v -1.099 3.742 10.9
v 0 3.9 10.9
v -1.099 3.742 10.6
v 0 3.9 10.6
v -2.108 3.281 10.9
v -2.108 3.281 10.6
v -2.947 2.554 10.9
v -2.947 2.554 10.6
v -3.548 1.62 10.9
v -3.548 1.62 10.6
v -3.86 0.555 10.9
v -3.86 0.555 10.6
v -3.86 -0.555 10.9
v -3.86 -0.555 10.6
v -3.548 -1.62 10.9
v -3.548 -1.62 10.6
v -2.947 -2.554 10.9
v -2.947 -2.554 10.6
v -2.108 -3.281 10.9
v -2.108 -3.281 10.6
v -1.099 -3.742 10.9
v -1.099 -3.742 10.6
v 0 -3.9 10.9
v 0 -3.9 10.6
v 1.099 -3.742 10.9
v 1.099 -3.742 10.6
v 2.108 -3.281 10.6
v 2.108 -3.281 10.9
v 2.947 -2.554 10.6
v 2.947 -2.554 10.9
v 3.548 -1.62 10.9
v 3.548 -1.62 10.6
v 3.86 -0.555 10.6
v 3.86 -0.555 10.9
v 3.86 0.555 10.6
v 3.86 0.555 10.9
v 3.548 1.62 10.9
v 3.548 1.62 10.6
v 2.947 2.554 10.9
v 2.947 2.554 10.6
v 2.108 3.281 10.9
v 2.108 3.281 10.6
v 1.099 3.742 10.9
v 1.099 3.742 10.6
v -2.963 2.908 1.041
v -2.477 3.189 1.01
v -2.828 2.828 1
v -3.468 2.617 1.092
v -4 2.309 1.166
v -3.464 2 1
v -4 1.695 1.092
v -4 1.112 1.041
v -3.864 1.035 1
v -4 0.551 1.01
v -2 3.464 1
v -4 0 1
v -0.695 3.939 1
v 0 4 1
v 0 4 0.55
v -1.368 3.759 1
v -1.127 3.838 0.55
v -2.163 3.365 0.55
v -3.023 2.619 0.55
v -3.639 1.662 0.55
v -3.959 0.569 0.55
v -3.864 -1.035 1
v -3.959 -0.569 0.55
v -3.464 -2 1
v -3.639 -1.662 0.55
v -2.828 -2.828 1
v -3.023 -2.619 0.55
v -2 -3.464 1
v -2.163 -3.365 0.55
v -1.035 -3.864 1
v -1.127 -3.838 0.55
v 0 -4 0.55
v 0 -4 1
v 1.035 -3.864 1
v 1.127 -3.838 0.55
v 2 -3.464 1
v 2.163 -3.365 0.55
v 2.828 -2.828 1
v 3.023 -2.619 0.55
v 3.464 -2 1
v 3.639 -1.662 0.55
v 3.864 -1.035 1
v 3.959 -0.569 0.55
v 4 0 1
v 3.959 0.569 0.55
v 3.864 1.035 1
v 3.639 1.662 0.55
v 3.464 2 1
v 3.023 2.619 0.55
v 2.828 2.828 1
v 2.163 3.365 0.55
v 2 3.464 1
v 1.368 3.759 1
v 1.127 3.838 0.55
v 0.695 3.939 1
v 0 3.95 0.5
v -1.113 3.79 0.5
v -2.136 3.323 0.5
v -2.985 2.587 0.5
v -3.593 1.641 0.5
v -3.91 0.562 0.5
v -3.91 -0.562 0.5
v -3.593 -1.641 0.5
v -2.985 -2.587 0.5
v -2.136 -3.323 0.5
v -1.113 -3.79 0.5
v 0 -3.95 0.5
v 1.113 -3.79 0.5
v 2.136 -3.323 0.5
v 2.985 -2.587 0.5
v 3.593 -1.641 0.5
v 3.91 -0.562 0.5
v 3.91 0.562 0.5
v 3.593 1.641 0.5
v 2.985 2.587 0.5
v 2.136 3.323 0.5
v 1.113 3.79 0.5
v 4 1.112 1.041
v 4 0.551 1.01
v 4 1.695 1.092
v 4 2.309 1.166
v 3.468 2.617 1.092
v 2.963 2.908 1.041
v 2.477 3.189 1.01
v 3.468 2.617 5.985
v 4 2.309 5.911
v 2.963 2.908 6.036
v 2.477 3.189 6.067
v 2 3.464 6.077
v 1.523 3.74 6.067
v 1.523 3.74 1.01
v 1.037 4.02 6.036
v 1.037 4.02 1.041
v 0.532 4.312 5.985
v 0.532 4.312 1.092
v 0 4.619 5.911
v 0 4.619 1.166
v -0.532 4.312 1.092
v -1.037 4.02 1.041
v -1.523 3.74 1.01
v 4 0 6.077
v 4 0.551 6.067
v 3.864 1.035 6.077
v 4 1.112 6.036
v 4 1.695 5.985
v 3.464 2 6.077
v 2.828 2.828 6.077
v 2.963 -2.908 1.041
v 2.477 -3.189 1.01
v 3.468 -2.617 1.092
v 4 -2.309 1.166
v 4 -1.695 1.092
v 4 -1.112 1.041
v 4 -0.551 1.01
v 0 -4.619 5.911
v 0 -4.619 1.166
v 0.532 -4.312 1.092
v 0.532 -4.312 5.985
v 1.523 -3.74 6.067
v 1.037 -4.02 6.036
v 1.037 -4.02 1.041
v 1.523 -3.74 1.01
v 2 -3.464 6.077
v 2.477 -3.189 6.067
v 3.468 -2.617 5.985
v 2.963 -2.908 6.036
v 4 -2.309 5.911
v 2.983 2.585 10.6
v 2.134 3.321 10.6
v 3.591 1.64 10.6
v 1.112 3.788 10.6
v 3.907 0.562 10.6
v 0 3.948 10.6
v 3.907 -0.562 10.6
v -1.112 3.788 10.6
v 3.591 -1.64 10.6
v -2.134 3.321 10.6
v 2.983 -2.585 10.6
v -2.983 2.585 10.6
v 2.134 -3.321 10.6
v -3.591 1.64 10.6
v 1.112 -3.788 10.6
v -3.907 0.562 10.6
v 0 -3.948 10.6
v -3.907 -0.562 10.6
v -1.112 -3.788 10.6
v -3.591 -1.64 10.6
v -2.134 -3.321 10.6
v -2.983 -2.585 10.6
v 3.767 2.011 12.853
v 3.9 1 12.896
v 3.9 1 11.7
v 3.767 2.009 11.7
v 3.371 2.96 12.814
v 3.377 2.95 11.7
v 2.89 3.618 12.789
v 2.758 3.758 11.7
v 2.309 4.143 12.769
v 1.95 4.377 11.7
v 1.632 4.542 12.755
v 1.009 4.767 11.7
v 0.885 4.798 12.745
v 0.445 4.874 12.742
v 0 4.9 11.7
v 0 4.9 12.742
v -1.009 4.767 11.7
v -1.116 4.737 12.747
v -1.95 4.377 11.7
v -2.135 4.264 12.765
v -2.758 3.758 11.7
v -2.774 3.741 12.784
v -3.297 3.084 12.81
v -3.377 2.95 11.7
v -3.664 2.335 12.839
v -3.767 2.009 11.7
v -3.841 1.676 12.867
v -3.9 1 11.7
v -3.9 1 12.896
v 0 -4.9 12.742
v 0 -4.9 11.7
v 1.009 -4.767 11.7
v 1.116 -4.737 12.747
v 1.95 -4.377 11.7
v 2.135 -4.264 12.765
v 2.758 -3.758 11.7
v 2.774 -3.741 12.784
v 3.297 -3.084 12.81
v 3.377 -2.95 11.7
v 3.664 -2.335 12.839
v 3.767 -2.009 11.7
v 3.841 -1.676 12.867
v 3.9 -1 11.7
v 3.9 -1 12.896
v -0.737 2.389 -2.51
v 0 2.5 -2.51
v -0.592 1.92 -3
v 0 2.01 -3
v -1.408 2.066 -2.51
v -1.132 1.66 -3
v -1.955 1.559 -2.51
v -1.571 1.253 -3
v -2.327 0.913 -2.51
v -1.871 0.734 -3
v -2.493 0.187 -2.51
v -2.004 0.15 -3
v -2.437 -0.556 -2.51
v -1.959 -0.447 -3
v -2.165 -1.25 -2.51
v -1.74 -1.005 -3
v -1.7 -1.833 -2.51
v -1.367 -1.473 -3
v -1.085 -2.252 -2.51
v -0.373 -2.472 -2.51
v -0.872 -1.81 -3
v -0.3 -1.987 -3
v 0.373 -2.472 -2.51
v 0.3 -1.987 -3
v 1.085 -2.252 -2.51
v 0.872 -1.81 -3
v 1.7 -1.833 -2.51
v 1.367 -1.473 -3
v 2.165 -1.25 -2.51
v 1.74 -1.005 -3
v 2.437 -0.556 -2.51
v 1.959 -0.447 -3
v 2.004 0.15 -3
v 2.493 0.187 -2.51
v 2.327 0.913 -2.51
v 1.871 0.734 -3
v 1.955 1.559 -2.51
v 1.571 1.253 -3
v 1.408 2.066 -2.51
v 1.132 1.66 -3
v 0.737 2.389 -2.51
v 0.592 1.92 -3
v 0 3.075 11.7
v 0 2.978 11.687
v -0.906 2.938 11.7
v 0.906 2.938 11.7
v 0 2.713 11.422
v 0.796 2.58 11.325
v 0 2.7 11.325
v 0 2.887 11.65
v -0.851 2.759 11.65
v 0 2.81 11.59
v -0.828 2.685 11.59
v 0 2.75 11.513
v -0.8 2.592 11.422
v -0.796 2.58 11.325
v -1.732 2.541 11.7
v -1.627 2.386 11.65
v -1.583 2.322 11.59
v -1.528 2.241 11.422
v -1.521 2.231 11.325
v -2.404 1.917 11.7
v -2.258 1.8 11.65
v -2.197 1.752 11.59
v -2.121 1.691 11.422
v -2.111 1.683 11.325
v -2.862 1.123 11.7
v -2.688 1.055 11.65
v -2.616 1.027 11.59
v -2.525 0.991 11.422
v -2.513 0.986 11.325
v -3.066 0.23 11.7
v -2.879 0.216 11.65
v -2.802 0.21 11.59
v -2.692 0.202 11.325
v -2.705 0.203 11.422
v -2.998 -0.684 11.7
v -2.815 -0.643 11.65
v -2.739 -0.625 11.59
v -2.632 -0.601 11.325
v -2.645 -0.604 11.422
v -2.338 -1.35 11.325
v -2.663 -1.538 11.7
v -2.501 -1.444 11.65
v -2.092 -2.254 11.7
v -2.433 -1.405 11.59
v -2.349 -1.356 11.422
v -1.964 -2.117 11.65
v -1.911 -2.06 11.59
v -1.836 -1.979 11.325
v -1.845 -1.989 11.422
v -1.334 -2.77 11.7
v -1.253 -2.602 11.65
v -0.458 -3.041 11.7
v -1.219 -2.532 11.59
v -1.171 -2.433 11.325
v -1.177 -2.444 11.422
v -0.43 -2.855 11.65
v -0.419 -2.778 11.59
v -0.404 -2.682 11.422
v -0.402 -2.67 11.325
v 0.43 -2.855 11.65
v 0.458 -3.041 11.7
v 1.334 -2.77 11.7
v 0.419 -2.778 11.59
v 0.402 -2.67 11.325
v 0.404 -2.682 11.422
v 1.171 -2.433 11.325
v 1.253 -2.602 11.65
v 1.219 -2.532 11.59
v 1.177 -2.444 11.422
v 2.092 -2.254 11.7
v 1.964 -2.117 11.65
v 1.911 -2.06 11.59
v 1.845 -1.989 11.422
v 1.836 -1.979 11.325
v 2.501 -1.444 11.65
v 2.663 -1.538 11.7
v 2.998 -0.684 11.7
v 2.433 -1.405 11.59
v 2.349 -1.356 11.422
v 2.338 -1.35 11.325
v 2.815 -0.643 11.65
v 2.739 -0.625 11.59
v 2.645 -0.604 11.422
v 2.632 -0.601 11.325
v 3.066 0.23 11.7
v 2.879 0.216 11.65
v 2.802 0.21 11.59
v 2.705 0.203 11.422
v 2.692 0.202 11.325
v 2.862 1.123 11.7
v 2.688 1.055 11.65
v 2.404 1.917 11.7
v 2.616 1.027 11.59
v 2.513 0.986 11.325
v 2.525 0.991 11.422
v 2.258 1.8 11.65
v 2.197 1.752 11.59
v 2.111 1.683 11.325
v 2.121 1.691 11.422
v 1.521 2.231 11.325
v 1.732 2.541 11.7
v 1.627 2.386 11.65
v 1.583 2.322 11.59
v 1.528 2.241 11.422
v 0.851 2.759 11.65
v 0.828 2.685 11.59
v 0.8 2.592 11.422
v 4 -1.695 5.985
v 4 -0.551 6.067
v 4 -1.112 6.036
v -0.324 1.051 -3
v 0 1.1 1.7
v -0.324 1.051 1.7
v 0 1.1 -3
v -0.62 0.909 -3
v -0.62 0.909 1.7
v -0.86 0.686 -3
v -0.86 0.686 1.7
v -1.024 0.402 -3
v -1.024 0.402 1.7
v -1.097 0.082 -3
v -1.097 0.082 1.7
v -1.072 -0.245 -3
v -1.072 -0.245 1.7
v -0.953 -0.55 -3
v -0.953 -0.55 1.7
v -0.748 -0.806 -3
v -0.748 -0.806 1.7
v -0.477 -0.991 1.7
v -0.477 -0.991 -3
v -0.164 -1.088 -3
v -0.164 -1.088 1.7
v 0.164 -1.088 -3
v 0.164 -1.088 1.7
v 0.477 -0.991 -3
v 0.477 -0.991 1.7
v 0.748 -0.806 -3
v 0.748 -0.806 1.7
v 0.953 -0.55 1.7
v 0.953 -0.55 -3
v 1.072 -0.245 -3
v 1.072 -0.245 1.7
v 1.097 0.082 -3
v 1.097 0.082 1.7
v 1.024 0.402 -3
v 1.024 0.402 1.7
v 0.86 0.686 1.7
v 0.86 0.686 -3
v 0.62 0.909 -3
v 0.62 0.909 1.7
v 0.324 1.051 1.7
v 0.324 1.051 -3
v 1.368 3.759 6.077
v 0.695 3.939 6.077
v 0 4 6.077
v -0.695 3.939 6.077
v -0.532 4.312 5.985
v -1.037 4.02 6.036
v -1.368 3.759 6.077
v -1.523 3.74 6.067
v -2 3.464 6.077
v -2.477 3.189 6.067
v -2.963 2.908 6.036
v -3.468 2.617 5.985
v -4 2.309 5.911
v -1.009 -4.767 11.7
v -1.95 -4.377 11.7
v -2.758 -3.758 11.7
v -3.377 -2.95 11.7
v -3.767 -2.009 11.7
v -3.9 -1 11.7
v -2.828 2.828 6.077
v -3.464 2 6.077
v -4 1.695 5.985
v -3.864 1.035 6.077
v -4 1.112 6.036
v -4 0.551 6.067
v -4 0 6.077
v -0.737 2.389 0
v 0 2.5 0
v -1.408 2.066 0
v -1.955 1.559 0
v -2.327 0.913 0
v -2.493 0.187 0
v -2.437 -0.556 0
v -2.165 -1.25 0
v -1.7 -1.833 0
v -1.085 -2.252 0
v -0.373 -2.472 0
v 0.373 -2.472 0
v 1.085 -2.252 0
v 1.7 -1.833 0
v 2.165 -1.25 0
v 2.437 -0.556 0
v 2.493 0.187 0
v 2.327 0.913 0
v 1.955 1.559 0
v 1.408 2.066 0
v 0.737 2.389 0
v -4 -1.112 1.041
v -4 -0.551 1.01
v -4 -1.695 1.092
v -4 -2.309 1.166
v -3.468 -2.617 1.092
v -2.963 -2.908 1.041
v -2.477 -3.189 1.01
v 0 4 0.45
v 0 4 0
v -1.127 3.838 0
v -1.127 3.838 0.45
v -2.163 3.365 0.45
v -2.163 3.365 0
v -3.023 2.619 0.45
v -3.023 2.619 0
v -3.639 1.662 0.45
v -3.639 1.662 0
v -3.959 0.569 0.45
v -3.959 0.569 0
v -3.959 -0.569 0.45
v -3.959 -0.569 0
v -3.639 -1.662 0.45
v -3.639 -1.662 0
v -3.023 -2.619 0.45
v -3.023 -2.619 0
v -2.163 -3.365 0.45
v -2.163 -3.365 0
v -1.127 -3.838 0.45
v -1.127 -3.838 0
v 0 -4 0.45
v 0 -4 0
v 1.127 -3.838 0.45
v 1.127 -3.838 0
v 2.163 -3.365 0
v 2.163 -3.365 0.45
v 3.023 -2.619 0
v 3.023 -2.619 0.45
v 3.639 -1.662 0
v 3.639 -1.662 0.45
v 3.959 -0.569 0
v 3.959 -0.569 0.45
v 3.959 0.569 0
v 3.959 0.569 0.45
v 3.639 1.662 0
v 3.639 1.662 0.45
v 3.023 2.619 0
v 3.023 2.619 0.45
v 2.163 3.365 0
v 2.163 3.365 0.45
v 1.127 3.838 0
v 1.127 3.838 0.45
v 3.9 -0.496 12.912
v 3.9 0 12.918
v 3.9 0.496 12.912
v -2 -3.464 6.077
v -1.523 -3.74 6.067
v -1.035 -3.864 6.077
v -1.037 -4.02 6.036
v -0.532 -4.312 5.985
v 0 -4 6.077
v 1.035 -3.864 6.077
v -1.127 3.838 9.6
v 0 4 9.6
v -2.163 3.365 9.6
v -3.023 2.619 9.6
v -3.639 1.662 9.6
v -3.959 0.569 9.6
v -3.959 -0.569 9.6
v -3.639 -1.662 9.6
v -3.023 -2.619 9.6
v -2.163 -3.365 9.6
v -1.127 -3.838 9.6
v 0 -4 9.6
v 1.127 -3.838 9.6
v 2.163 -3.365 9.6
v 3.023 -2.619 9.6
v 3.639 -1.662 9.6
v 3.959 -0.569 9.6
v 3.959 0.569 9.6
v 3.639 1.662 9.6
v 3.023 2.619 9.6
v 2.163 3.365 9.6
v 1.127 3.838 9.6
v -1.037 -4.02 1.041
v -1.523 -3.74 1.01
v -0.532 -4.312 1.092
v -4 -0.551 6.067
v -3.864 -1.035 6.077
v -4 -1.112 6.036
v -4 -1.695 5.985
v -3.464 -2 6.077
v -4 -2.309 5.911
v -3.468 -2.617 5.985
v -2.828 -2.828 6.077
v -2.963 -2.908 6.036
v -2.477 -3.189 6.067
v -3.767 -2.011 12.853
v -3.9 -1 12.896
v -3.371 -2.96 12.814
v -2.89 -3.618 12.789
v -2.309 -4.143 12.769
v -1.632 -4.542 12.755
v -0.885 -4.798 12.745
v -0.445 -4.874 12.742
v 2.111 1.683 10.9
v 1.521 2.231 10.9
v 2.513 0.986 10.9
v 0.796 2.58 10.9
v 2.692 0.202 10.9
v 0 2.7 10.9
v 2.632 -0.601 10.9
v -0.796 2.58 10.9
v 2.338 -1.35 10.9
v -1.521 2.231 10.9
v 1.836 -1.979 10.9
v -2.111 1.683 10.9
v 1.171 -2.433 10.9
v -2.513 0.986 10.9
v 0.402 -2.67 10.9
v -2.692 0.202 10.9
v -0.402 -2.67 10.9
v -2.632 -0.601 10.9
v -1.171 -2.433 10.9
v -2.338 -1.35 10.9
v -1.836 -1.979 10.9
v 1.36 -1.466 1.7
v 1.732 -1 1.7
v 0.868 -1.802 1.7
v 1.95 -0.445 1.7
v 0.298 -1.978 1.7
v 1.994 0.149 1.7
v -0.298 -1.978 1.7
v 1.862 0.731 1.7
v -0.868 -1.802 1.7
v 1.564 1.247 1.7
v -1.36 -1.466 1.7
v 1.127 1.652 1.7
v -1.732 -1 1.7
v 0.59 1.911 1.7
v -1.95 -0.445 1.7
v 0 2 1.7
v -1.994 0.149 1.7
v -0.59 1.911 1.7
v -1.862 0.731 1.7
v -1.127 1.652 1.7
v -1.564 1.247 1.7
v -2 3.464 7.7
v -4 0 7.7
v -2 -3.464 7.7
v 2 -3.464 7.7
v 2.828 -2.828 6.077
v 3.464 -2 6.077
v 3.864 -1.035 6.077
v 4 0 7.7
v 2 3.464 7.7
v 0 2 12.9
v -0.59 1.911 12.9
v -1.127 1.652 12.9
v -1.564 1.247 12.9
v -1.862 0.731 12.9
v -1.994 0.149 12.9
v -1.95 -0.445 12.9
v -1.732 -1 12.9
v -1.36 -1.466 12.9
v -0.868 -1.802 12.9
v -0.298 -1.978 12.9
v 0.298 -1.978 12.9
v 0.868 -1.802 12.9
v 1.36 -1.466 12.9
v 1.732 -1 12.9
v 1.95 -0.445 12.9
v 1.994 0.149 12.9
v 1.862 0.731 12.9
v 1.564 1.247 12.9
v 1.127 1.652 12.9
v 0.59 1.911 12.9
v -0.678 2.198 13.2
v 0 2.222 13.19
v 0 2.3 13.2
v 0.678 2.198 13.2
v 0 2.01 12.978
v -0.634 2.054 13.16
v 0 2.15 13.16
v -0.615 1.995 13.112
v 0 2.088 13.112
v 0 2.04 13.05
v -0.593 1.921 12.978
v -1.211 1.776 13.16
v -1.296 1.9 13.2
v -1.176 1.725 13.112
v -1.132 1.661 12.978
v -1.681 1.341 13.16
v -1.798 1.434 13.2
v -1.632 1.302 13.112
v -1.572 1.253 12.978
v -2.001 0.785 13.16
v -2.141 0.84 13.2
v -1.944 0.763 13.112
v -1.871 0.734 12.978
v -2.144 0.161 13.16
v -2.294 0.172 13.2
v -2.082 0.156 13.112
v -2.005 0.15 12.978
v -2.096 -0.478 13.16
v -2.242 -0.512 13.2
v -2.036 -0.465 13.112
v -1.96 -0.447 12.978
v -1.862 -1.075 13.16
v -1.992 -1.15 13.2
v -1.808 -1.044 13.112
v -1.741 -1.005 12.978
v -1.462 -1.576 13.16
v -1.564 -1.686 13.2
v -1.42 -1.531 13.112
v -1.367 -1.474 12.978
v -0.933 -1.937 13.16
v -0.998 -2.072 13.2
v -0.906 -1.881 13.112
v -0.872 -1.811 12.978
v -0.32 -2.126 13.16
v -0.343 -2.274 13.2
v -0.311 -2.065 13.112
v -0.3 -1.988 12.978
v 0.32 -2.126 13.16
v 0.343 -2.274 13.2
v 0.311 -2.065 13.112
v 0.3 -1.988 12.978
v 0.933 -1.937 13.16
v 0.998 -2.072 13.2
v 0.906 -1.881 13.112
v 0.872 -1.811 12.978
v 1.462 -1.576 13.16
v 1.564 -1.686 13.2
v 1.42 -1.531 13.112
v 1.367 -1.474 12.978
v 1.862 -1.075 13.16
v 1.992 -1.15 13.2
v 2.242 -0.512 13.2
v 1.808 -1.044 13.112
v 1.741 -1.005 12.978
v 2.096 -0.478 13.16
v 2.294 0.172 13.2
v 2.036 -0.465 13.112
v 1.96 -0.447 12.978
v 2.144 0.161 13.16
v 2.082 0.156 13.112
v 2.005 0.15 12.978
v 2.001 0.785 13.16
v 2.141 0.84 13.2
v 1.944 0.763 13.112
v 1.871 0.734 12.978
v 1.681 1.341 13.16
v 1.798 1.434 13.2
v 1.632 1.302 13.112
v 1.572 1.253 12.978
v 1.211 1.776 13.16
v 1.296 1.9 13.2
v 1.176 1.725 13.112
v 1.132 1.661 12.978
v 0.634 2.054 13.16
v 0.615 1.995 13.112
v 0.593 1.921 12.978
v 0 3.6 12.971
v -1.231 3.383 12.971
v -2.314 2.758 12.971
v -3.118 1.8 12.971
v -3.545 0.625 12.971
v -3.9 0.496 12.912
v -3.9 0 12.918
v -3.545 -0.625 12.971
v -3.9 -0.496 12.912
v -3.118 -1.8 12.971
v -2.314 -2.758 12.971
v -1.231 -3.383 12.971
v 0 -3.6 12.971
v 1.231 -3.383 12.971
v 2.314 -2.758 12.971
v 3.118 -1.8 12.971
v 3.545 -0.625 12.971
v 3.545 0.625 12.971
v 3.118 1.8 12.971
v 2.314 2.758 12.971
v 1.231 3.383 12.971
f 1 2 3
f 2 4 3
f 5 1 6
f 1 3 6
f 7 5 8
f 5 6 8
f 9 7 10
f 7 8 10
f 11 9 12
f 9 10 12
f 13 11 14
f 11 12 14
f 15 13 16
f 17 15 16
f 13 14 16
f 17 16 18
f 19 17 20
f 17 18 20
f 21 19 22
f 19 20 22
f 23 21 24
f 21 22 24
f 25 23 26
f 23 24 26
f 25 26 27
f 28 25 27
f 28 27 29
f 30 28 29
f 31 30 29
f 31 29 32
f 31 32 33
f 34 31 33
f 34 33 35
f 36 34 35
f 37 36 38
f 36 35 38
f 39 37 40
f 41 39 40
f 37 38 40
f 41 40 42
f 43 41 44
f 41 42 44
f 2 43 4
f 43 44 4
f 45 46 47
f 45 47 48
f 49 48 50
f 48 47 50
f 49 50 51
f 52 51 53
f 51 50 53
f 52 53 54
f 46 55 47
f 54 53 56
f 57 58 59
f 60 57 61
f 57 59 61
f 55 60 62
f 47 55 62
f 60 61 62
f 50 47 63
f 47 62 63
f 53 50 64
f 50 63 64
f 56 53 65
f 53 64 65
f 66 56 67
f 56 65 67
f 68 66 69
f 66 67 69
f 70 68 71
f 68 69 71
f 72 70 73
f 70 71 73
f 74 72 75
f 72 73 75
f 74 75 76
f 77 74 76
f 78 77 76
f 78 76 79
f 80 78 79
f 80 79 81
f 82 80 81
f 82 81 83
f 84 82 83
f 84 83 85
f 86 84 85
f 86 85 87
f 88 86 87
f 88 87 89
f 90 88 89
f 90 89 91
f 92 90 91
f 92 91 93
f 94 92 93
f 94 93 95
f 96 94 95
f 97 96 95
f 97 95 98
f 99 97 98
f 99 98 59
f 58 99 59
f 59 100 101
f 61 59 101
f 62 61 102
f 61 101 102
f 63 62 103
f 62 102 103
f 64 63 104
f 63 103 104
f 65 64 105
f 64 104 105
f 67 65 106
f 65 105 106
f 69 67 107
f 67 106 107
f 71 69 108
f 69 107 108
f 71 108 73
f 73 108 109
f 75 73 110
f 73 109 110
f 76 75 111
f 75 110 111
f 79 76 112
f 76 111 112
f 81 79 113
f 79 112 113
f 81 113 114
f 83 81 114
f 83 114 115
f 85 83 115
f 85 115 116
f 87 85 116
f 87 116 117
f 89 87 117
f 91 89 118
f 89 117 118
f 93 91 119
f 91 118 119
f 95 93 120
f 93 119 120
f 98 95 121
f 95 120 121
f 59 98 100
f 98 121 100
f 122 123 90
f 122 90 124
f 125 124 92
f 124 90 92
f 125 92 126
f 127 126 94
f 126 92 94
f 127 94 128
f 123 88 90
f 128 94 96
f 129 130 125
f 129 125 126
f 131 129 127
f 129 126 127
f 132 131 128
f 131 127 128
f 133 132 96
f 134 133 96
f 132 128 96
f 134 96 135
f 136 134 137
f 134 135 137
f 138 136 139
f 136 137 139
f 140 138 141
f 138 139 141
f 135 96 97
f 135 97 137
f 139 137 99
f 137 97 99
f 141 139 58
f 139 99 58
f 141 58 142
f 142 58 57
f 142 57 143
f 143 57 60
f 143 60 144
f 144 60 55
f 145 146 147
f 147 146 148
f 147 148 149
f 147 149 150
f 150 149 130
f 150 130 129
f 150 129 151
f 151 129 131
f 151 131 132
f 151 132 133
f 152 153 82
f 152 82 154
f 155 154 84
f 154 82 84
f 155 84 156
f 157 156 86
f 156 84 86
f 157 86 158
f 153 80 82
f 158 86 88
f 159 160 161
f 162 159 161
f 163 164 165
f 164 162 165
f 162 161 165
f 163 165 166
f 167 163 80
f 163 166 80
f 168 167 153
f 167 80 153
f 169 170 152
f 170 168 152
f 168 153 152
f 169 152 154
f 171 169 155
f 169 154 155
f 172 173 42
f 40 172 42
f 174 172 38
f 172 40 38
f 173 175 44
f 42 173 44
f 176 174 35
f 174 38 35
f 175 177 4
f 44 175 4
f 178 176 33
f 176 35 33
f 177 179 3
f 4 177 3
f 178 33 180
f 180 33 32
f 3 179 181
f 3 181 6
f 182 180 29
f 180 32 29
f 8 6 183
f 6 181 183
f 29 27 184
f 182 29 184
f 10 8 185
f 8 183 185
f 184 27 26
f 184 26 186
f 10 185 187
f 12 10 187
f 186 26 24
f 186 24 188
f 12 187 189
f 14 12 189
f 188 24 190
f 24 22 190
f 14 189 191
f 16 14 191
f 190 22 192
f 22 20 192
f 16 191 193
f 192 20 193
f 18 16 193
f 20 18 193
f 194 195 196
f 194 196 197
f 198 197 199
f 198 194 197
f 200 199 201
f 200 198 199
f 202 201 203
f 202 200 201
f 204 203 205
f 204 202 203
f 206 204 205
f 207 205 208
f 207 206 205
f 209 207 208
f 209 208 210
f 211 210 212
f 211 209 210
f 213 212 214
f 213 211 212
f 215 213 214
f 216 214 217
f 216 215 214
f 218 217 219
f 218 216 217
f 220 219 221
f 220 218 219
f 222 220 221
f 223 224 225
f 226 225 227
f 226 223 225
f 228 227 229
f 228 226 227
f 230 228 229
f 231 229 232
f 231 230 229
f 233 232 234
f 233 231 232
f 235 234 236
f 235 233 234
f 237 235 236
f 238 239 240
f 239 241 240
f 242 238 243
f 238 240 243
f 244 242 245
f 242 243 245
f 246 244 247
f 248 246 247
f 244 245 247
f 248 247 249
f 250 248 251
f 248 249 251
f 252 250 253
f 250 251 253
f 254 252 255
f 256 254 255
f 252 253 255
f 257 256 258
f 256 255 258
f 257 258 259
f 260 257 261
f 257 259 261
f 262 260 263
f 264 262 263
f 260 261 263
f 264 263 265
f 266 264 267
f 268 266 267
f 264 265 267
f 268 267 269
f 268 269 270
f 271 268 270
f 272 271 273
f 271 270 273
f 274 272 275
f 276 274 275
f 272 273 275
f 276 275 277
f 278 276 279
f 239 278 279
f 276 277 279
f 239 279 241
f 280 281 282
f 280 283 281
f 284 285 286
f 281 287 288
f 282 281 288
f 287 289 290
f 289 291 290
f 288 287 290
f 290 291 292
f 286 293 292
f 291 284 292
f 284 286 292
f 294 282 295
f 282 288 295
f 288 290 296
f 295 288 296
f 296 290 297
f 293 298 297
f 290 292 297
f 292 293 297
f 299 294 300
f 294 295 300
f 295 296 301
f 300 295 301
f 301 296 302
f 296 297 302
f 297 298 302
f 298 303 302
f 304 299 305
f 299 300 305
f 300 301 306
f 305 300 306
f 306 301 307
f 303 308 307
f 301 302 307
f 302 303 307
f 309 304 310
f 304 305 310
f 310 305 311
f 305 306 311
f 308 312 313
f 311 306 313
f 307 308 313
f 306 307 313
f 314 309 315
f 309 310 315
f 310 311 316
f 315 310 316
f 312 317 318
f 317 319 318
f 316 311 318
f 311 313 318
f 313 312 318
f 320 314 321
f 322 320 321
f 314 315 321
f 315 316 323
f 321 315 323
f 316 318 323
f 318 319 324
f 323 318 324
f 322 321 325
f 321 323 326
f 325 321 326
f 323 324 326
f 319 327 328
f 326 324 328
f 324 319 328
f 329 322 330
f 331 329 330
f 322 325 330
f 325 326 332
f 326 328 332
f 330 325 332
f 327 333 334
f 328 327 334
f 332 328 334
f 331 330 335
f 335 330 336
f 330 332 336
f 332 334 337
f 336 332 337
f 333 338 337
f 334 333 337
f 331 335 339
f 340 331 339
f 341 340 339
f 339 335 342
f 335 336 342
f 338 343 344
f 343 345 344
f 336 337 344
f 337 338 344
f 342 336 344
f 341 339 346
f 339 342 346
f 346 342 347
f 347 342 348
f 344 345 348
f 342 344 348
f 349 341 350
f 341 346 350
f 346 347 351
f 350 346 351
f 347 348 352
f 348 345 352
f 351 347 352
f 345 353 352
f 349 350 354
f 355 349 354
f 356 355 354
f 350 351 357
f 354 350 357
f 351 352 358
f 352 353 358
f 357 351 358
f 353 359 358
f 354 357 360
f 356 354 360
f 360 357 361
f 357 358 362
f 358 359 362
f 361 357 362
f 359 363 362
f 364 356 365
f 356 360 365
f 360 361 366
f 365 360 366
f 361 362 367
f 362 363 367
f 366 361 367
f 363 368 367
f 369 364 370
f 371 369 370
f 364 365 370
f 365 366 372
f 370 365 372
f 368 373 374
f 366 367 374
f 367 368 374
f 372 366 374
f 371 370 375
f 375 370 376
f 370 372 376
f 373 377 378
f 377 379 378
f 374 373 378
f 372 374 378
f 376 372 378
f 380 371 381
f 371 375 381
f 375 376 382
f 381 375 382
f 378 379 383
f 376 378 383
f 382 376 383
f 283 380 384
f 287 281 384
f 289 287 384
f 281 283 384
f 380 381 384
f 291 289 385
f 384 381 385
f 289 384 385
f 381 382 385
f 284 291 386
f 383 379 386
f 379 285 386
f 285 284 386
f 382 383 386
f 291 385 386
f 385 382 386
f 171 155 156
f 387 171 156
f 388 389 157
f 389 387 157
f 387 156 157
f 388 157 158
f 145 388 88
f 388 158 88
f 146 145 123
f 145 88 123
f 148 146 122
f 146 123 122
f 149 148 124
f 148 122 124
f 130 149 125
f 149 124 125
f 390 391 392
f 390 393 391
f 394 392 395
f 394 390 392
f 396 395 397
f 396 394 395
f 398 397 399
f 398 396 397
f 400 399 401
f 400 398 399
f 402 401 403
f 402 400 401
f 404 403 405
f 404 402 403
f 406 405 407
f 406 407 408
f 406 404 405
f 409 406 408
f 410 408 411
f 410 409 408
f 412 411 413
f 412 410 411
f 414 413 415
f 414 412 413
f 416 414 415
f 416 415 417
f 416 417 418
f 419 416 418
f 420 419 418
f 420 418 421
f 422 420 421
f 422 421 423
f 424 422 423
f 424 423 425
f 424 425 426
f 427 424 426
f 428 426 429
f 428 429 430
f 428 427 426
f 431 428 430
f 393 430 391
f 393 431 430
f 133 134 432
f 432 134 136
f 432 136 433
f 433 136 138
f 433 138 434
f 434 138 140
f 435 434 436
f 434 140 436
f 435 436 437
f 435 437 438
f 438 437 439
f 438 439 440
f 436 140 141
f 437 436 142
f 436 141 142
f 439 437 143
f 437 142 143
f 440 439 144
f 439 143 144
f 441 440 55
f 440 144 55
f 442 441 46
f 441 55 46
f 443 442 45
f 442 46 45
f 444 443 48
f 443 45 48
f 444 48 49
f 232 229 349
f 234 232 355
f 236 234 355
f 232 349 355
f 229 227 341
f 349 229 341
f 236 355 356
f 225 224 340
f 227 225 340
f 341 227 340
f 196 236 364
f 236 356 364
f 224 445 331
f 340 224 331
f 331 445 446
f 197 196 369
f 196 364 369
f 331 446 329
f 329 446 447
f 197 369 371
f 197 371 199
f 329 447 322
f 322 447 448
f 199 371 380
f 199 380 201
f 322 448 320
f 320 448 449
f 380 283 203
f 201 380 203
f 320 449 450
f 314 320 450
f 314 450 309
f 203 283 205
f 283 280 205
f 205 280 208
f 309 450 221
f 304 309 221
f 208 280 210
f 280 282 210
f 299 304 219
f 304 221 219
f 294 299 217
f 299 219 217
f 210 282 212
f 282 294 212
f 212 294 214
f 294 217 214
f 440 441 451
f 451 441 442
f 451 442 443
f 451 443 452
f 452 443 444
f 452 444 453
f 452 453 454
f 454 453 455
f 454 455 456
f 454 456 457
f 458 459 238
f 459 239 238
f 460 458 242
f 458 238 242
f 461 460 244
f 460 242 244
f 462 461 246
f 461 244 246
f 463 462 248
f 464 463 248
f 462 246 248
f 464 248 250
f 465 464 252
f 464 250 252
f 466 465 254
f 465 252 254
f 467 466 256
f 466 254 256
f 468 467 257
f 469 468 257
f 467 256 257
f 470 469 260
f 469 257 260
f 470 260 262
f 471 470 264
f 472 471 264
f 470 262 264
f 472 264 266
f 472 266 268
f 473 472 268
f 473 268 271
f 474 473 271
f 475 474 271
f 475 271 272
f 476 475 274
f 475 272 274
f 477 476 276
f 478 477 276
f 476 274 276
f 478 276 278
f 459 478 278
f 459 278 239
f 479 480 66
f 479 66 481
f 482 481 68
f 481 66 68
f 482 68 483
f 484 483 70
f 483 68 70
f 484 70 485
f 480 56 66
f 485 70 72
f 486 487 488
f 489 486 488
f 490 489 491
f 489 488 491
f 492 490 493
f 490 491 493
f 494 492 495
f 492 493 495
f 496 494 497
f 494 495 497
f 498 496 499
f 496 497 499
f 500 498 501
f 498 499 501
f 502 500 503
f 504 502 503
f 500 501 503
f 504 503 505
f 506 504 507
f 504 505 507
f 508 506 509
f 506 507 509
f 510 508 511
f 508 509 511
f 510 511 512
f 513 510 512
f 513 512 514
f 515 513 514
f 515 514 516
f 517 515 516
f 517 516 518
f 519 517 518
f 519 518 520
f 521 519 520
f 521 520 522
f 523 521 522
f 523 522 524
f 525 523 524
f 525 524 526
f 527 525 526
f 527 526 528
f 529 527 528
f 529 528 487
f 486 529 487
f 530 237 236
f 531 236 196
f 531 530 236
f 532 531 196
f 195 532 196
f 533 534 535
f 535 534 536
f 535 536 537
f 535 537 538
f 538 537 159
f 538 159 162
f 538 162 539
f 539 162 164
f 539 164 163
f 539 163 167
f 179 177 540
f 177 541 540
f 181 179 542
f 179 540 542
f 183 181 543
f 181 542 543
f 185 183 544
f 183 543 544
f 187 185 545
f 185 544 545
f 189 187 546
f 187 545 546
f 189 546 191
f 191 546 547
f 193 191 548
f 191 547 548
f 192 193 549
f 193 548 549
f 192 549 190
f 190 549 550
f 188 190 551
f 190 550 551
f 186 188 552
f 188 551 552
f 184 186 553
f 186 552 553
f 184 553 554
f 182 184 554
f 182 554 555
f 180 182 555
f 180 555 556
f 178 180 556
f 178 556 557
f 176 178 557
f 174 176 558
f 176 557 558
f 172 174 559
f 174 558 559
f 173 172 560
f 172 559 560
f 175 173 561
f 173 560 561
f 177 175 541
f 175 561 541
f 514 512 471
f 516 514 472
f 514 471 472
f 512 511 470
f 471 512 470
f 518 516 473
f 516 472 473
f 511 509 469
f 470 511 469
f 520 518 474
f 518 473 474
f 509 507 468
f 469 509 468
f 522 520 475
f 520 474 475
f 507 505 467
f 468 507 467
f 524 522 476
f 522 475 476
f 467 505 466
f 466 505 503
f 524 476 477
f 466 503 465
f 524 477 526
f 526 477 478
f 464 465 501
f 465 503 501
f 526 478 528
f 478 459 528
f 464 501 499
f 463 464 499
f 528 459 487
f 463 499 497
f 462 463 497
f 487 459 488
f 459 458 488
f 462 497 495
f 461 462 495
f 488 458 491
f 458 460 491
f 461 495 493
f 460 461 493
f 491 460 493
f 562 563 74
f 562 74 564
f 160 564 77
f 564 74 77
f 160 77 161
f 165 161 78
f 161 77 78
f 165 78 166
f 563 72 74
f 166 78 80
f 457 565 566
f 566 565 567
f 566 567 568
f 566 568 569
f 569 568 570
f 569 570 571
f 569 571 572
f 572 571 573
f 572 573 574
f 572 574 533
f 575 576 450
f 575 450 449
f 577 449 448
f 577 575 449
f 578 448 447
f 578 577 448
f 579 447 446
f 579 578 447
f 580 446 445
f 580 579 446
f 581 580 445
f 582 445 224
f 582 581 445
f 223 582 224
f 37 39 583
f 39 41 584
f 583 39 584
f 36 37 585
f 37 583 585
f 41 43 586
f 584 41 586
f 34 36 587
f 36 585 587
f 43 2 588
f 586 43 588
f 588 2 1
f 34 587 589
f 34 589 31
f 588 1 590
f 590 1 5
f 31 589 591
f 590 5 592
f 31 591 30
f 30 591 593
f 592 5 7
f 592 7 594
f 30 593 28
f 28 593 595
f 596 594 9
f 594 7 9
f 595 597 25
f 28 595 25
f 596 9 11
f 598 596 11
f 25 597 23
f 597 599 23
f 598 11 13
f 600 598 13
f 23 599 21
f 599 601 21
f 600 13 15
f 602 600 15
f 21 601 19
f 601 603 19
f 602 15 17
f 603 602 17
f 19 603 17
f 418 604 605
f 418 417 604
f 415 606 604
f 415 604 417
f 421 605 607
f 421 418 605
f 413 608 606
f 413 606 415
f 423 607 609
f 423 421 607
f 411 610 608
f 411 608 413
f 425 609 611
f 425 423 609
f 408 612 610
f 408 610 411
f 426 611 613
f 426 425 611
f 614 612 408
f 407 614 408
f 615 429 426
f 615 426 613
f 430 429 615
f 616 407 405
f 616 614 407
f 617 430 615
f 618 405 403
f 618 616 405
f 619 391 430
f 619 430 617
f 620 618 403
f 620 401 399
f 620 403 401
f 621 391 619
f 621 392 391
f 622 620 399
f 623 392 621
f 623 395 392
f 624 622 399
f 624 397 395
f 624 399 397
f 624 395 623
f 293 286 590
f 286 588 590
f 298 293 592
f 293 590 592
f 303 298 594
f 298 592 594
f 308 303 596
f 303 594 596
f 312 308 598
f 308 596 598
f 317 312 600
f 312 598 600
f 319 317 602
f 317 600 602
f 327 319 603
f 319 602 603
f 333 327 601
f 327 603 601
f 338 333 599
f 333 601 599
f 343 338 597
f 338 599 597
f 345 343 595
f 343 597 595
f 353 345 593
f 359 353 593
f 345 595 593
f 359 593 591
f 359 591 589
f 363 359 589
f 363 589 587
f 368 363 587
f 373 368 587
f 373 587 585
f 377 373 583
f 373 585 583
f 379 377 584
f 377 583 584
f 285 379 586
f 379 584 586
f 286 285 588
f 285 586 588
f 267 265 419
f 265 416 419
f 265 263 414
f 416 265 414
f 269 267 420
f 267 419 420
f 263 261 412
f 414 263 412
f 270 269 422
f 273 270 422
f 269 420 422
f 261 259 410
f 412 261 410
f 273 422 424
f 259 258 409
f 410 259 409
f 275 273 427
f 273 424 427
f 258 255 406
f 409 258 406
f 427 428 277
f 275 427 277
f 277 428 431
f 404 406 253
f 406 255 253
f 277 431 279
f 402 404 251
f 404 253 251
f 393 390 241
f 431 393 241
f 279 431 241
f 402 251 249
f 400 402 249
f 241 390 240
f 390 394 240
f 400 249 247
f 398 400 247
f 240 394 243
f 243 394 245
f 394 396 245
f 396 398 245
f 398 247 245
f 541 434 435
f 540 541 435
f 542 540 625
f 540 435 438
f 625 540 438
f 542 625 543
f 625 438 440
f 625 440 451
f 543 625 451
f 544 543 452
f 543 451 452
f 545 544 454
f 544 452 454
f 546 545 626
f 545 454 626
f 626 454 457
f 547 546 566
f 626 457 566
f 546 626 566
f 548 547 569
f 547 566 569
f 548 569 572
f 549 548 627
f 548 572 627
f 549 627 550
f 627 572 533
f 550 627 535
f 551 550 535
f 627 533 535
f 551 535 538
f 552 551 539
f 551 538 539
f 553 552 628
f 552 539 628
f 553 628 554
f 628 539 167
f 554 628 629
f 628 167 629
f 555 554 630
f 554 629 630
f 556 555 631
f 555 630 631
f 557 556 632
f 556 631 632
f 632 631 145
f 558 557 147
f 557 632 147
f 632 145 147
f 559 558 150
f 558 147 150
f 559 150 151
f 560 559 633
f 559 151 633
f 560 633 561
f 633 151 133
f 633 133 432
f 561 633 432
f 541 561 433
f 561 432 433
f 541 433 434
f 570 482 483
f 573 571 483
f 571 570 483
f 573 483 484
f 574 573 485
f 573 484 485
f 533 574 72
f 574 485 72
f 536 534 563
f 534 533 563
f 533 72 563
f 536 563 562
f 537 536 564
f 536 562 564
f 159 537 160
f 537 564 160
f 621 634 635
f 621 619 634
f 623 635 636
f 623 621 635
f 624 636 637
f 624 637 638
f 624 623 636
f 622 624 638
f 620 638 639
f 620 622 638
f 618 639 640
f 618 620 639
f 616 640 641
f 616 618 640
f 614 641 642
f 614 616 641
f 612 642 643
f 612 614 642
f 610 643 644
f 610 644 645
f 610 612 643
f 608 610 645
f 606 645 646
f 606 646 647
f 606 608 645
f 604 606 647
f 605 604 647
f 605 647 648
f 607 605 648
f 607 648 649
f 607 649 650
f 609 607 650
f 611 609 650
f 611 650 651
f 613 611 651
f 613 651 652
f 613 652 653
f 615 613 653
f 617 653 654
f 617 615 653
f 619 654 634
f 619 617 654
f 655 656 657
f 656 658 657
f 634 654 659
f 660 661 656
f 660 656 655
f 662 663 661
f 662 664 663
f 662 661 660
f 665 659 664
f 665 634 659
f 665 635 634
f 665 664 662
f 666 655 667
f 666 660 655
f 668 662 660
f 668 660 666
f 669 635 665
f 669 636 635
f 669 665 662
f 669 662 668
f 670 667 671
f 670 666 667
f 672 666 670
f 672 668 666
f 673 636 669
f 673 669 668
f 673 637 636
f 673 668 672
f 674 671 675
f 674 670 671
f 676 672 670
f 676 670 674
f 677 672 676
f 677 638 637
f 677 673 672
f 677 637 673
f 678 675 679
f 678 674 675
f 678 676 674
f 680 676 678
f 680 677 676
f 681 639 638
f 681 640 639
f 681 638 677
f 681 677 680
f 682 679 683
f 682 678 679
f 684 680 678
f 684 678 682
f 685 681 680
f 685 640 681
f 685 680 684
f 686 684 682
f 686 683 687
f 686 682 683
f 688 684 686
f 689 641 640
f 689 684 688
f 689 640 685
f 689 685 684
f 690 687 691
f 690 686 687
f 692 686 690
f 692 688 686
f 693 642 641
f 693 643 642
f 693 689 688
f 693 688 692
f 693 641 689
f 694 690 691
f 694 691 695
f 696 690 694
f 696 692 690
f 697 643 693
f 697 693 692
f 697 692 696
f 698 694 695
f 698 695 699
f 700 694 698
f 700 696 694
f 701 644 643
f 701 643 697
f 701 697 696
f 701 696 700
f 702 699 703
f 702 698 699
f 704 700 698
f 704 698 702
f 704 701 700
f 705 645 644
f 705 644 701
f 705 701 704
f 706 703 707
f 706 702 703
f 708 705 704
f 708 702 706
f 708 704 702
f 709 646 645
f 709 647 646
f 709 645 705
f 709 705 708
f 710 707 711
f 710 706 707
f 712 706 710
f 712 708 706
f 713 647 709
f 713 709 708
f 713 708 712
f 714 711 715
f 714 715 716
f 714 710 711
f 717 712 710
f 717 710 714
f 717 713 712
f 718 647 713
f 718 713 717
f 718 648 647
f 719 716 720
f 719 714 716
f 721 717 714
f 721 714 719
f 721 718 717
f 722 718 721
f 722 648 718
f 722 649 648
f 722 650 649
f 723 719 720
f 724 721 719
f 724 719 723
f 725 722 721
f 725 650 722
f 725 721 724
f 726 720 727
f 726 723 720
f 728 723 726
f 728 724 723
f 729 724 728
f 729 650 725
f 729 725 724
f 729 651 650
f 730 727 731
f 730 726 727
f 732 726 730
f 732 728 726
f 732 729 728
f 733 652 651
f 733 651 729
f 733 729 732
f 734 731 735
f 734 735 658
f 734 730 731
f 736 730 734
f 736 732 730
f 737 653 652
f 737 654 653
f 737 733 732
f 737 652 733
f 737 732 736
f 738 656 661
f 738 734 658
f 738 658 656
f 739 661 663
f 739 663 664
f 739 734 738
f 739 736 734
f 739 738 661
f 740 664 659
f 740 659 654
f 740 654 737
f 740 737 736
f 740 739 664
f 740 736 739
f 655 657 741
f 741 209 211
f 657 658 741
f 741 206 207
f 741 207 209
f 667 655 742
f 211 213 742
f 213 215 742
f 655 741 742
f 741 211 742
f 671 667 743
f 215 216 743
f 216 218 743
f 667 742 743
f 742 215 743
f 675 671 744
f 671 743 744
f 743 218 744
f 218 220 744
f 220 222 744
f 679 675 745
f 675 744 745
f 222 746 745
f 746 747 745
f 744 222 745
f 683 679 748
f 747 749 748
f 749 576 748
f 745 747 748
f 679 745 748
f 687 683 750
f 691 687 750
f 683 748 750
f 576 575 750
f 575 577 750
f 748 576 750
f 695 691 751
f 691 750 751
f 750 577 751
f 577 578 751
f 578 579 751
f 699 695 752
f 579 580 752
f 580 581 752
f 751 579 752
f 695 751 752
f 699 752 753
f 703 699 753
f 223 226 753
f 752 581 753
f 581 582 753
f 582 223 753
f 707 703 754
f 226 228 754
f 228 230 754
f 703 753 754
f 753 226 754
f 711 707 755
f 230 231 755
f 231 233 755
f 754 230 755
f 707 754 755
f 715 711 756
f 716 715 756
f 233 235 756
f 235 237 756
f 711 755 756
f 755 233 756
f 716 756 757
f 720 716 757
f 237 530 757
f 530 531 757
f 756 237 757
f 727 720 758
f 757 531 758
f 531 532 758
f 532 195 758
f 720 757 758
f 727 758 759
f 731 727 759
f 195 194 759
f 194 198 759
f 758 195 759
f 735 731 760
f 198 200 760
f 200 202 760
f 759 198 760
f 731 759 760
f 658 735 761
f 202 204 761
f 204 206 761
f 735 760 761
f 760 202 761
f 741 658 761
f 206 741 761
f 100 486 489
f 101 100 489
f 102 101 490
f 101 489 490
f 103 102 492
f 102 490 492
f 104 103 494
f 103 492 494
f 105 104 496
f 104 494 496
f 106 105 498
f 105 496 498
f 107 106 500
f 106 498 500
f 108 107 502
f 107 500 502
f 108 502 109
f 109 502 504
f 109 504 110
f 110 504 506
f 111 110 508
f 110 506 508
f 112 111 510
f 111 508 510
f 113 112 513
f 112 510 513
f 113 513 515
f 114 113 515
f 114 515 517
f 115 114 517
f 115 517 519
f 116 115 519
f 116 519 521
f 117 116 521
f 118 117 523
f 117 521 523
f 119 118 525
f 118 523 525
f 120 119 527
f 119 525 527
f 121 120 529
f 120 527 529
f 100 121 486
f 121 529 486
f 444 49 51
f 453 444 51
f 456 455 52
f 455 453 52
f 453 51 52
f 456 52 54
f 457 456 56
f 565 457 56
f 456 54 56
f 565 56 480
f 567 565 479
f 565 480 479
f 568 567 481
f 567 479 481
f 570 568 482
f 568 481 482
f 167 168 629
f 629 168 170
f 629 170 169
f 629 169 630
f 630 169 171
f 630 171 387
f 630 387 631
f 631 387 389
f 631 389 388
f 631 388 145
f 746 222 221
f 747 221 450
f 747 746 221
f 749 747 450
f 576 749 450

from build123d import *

# Parameters (mm, degrees)
CUT_EXTRUDE1_DEPTH = 1.5
SKETCH3_W          = 16
SKETCH3_H          = 16
CUT_EXTRUDE2_DEPTH = 7.7


with BuildPart() as part:
    # Sketch1 → Revolve1 (revolve)
    with BuildSketch(Plane(origin=(0, 0, 0), x_dir=(0, 0, -1), z_dir=(1, 0, 0))):
        with BuildLine():
            Line((-13.2, 0), (-13.2, 2.3))
            Line((-13.2, 2.3), (-12.735426078, 4.934729636))
            ThreePointArc((-12.735426078, 4.934729636), (-12.66702205, 5.053208889), (-12.538464528, 5.1))
            Line((-12.538464528, 5.1), (-11.7, 5.1))
            Line((-11.7, 5.1), (-11.7, 3.075))
            ThreePointArc((-11.7, 3.075), (-11.590165043, 2.809834957), (-11.325, 2.7))
            Line((-11.325, 2.7), (-10.9, 2.7))
            Line((-10.9, 2.7), (-10.9, 3.9))
            Line((-10.9, 3.9), (-10.6, 3.9))
            Line((-10.6, 3.9), (-10.6, 3.947592221))
            Line((-10.6, 3.947592221), (-9.6, 4))
            Line((-9.6, 4), (-6.076923077, 4))
            Line((-6.076923077, 4), (-5.905435594, 4.64))
            Line((-5.905435594, 4.64), (-1.171487483, 4.64))
            Line((-1.171487483, 4.64), (-1, 4))
            Line((-1, 4), (-0.55, 4))
            Line((-0.55, 4), (-0.5, 3.95))
            Line((-0.5, 3.95), (-0.45, 4))
            Line((-0.45, 4), (0, 4))
            Line((0, 4), (0, 0))
            Line((0, 0), (-13.2, 0))
        make_face()
    revolve(axis=Axis((0, 0, 0), (0, 0, 1)))

    # Sketch2 → Cut-Extrude1 (cut)
    with BuildSketch(Plane.XY.offset(13.2)):
        Polygon((-5.88, -3.394819583), (0, -6.789639166), (5.88, -3.394819583), (5.88, 3.394819583), (0, 6.789639166), (-5.88, 3.394819583), align=None)
        with BuildLine():
            Line((-3.9, 1), (-3.9, -1))
            ThreePointArc((-3.9, -1), (-2.757716447, -3.757716447), (0, -4.9))
            ThreePointArc((0, -4.9), (2.757716447, -3.757716447), (3.9, -1))
            Line((3.9, -1), (3.9, 1))
            ThreePointArc((3.9, 1), (2.757716447, 3.757716447), (0, 4.9))
            ThreePointArc((0, 4.9), (-2.757716447, 3.757716447), (-3.9, 1))
        make_face(mode=Mode.SUBTRACT)
    extrude(amount=-CUT_EXTRUDE1_DEPTH, mode=Mode.SUBTRACT)

    # Sketch3 → Cut-Extrude2 (cut)
    with BuildSketch(Plane.XY):
        Rectangle(SKETCH3_W, SKETCH3_H)
        Polygon((-4, -2.309401077), (0, -4.618802154), (4, -2.309401077), (4, 2.309401077), (0, 4.618802154), (-4, 2.309401077), align=None, mode=Mode.SUBTRACT)
    extrude(amount=CUT_EXTRUDE2_DEPTH, mode=Mode.SUBTRACT)

    # Sketch4 → Revolve2 (revolve)
    with BuildSketch(Plane(origin=(0, 0, 0), x_dir=(0, 0, -1), z_dir=(1, 0, 0))):
        Polygon((0, 0), (0, 2.5), (2.5095, 2.5), (3, 2.0095), (3, 0), align=None)
    revolve(axis=Axis((0, 0, -3), (0, 0, 1)))

    # Sketch5 → Cut-Revolve1 (revolve, cut)
    with BuildSketch(Plane(origin=(0, 0, 0), x_dir=(0, 0, -1), z_dir=(1, 0, 0))):
        with BuildLine():
            Line((-13.2, 0), (-13.2, 2.3))
            ThreePointArc((-13.2, 2.3), (-13.112132034, 2.087867966), (-12.9, 2))
            Line((-12.9, 2), (-1.7, 2))
            Line((-1.7, 2), (-1.7, 1.1))
            Line((-1.7, 1.1), (3, 1.1))
            Line((3, 1.1), (3, 0))
            Line((3, 0), (-13.2, 0))
        make_face()
    revolve(axis=Axis((0, 0, -3), (0, 0, 1)), mode=Mode.SUBTRACT)


solid = part.part
